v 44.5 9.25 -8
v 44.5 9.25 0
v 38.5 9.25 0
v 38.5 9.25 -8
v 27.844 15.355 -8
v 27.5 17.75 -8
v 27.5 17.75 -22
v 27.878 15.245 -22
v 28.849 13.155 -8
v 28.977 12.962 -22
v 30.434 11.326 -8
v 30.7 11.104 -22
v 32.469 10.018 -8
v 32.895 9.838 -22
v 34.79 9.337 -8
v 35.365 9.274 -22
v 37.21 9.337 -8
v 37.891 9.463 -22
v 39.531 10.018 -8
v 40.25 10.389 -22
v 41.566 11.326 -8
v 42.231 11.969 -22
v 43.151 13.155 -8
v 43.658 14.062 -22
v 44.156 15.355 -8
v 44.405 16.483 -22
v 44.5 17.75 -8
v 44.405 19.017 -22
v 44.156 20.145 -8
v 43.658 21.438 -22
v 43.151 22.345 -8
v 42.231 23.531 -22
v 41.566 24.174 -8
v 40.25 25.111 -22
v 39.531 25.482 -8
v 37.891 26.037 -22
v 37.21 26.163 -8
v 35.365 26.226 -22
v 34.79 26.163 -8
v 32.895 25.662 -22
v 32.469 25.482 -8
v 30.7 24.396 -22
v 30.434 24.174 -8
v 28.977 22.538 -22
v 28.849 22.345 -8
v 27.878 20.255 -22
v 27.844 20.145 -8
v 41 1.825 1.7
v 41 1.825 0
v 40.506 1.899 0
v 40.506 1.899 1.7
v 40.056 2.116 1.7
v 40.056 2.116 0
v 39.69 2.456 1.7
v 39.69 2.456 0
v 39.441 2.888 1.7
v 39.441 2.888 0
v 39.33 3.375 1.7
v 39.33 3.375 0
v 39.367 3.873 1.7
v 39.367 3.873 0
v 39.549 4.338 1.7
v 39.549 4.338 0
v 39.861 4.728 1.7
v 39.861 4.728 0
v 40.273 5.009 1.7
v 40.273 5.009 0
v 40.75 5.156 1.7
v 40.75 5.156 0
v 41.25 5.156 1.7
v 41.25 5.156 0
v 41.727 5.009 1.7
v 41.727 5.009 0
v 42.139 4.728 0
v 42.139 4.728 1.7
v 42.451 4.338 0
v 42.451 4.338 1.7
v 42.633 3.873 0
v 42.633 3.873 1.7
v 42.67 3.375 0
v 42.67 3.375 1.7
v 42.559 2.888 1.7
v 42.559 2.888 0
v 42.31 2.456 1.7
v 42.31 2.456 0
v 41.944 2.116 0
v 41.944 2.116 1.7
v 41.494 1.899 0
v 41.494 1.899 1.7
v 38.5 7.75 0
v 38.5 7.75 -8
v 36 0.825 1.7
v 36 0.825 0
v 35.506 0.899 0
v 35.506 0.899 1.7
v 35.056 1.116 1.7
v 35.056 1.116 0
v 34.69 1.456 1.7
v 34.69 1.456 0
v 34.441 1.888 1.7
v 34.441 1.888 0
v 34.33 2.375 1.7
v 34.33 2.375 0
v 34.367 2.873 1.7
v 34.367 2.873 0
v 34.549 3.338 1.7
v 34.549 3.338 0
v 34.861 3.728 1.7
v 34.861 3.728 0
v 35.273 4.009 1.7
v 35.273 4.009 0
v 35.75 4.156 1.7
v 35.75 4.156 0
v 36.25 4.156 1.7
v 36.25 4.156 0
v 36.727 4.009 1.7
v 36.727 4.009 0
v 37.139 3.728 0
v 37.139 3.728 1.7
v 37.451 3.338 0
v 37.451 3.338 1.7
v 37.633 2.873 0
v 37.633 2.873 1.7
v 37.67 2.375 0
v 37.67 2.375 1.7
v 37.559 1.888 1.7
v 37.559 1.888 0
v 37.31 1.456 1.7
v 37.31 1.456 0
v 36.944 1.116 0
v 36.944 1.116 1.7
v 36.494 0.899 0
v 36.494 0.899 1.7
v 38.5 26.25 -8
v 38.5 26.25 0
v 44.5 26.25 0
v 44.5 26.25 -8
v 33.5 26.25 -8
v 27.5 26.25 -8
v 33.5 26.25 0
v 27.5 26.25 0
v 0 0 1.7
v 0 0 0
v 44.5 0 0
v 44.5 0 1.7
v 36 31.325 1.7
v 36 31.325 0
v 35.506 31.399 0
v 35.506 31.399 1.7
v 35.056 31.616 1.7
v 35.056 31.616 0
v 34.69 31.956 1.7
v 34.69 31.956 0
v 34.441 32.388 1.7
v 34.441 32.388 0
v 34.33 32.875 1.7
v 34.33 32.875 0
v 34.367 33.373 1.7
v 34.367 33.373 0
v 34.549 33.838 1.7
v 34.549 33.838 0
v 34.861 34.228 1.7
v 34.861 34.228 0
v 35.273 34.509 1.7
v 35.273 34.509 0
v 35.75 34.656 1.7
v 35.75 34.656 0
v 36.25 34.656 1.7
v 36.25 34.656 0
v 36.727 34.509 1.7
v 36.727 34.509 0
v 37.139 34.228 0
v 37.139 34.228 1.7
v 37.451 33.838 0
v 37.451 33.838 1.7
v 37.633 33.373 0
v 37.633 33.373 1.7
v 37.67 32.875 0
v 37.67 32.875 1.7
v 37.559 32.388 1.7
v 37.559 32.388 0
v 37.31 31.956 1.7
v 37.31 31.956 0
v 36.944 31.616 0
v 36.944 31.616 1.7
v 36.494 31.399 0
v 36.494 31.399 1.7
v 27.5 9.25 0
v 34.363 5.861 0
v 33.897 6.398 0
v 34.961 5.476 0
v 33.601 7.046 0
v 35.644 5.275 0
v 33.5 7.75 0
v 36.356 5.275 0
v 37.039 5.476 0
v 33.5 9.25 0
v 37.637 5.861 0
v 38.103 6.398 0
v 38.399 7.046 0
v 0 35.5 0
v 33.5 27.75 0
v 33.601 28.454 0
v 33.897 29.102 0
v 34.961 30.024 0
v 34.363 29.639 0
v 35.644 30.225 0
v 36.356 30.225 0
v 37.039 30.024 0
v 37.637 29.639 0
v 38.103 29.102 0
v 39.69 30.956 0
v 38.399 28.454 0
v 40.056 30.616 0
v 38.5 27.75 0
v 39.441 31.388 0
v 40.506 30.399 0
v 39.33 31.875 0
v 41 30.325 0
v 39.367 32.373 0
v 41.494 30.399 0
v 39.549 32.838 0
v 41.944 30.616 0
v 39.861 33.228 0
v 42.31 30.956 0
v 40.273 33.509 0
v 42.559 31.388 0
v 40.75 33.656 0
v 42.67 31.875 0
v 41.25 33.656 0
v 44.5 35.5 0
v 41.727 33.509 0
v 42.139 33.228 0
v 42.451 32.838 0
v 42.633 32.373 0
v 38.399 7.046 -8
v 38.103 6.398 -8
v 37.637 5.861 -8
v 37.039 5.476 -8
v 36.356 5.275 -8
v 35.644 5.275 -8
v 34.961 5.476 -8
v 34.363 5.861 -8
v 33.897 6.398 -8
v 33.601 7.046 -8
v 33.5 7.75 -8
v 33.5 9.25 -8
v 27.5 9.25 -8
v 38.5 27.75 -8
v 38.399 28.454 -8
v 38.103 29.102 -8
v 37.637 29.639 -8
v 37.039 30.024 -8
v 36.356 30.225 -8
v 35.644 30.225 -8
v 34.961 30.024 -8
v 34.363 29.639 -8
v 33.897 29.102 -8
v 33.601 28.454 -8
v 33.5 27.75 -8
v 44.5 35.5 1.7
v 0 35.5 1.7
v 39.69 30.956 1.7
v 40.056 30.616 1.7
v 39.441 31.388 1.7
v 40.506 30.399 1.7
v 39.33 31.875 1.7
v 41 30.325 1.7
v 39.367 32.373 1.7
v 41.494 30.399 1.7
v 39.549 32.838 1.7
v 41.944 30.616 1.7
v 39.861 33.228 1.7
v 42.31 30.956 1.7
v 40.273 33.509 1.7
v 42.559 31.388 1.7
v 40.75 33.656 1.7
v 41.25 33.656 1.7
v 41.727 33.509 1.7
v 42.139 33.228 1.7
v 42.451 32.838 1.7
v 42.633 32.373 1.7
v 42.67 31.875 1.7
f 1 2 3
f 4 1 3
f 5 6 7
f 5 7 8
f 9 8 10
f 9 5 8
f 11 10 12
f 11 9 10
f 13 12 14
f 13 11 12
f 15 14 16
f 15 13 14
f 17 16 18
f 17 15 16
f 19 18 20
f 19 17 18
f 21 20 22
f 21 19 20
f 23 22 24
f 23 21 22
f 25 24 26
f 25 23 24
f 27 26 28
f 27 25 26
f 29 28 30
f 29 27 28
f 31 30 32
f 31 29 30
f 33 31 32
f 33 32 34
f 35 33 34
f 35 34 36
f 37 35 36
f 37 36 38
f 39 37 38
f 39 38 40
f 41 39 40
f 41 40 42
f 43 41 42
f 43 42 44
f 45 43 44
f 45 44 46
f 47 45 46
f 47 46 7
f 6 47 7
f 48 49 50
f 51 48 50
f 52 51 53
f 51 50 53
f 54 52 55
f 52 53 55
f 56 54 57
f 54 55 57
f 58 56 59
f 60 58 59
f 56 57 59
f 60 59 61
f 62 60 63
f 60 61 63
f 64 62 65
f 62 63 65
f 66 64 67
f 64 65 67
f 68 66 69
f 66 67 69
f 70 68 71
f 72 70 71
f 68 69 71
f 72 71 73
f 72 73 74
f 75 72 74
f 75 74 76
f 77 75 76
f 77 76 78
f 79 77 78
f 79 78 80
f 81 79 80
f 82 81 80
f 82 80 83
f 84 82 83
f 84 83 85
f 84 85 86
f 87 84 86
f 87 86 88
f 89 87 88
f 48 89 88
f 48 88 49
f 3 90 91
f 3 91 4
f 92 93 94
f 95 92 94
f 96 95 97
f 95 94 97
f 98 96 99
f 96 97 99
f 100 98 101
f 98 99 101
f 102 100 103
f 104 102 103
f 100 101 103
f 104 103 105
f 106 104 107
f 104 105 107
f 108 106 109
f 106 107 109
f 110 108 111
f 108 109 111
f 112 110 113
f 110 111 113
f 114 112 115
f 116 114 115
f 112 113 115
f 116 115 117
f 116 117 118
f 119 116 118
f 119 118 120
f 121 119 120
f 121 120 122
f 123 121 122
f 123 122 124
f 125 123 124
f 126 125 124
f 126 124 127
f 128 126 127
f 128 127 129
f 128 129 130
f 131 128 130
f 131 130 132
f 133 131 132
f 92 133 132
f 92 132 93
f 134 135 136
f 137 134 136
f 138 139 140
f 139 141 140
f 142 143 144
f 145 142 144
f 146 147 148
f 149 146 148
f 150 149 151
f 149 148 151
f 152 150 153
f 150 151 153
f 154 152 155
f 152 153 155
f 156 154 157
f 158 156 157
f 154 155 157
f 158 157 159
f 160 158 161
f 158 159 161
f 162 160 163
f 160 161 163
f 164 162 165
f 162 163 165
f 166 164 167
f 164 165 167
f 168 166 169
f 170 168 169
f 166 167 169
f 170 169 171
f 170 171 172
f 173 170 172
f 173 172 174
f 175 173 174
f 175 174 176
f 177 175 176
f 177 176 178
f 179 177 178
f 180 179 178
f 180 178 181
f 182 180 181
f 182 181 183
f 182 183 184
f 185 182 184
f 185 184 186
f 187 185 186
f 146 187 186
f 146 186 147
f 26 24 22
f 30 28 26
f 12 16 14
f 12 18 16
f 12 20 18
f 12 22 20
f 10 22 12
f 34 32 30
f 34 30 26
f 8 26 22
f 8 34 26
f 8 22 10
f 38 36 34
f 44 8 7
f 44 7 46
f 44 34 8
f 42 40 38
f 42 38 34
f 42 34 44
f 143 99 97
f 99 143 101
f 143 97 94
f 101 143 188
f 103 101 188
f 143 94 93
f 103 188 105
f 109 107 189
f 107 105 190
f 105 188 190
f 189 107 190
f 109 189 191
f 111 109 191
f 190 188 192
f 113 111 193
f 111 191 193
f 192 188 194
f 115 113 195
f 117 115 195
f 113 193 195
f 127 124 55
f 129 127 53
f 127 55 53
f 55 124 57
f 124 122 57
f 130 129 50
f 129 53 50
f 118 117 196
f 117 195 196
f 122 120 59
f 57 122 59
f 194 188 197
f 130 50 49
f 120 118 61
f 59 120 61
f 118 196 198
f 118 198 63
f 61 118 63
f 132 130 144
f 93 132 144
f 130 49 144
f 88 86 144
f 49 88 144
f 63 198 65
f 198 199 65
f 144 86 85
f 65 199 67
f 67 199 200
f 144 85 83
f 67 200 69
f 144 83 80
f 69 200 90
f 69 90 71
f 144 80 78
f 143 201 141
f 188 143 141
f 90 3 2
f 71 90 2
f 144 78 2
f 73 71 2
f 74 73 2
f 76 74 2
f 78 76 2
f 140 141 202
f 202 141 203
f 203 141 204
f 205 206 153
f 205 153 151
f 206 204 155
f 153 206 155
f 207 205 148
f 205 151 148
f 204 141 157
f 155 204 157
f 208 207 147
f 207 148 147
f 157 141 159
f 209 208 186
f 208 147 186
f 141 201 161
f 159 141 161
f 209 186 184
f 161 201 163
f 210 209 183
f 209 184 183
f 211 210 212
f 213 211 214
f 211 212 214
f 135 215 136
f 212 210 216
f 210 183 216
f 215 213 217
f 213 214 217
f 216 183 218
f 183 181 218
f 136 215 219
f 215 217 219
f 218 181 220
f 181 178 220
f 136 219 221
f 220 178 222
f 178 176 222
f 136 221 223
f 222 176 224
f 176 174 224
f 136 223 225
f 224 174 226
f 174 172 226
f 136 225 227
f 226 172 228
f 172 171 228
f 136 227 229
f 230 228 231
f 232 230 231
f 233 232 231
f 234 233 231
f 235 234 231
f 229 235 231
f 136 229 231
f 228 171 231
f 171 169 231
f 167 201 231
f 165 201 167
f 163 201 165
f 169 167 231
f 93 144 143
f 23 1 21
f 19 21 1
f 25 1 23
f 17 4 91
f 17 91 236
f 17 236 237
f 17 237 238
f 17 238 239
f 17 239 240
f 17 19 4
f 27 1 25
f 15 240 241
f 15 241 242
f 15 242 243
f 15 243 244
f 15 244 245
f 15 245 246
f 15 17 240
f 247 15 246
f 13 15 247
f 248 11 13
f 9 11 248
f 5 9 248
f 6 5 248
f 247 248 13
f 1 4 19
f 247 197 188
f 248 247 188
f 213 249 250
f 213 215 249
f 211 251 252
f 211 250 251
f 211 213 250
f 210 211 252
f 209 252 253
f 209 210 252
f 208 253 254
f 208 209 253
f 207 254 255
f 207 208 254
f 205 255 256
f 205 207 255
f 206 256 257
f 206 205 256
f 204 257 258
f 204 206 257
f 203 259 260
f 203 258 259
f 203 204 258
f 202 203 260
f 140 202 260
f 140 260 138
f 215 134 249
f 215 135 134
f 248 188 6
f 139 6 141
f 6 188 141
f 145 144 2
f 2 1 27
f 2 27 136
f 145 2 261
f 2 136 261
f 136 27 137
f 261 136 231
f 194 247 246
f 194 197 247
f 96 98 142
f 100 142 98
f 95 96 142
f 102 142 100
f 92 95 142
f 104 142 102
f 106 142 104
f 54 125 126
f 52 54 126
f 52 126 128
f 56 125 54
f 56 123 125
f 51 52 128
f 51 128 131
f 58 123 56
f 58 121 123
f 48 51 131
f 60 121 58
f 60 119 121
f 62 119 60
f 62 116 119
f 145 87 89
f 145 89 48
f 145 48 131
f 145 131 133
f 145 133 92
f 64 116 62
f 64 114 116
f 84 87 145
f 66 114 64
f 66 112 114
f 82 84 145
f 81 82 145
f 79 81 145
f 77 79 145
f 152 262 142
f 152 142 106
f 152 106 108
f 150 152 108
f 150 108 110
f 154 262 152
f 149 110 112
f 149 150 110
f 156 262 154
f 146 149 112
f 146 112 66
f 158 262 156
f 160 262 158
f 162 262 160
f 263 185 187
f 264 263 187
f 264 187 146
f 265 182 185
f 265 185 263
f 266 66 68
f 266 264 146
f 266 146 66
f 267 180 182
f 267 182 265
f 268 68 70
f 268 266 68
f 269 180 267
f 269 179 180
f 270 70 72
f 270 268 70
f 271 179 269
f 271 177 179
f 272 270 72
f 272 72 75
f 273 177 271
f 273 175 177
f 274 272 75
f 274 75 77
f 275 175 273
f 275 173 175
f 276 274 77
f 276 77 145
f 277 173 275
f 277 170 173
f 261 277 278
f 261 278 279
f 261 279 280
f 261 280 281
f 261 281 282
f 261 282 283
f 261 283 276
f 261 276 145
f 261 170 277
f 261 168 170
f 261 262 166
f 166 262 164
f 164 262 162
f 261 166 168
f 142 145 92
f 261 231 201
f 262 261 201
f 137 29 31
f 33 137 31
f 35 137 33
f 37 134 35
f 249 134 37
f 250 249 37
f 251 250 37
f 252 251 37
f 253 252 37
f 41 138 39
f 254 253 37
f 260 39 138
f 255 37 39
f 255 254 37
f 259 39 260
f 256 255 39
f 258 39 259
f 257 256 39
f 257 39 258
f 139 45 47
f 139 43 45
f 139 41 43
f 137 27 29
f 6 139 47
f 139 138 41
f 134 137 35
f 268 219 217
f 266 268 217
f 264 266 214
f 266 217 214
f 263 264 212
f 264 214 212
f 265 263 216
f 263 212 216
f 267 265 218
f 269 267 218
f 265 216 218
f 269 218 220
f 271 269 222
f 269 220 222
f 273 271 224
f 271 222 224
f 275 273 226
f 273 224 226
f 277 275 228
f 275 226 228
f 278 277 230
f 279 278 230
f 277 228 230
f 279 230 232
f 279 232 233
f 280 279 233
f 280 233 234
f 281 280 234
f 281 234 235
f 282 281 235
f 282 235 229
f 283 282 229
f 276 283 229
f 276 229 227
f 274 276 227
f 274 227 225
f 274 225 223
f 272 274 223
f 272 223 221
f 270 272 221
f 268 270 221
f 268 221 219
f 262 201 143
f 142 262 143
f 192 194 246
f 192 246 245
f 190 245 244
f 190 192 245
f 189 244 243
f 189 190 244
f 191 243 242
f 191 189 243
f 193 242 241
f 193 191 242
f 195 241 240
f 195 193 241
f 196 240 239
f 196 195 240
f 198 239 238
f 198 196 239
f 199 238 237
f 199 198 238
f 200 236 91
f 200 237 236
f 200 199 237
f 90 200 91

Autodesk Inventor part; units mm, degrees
ref_plane "YZ Plane" through (0, 0, 0) normal (1, 0, 0) x (0, 1, 0)
ref_plane "XZ Plane" through (0, 0, 0) normal (0, 1, 0) x (-1, 0, 0)
ref_plane "XY Plane" through (0, 0, 0) normal (0, 0, 1) x (1, 0, 0)
sketch "Эскиз1" plane through (0, 0, 0) normal (0, 0, 1) x (1, 0, 0)
  line L0 (0, 0) -> (44.5, 0)
  line L1 (44.5, 0) -> (44.5, 35.5)
  line L2 (44.5, 35.5) -> (0, 35.5)
  line L3 (0, 35.5) -> (0, 0)
  dimension "d0" = 44.5
  dimension "d1" = 35.5
extrude "Выдавливание1" add sketch "Эскиз1" along normal blind 1.7
sketch "Эскиз2" plane through (0, 0, 1.7) normal (0, 0, 1) x (1, 0, 0)
  line L0 (0, 0) -> (44.5, 0) projected
  line L1 (44.5, 0) -> (44.5, 3.5)
  line L2 (44.5, 0) -> (44.5, 35.5) projected
  line L3 (44.5, 3.5) -> (41, 3.5)
  line L4 (44.5, 35.5) -> (44.5, 32)
  line L5 (44.5, 32) -> (41, 32)
  line L6 (44.5, 35.5) -> (0, 35.5) projected
  point P0 (36, 33)
  point P1 (36, 2.5)
  point P2 (36, 33)
  dimension "d4" = 3.5
  dimension "d5" = 3.5
  dimension "d6" = 3.5
  dimension "d7" = 3.5
  dimension "d26" = 8.5
  dimension "d27" = 8.5
  dimension "d28" = 2.5
  dimension "d29" = 2.5
hole "Отверстие1" at (41, 32, 1.7) at (41, 3.5, 1.7) at (36, 33, 1.7) at (36, 2.5, 1.7) direction (0, 0, -1) diameter 3.35 depth 15
sketch "Эскиз3" plane through (0, 0, 0) normal (0, 0, -1) x (-1, 0, 0)
  line L0 (-44.5, 0) -> (-44.5, 35.5) projected
  line L1 (-44.5, 0) -> (-44.5, 9.25)
  line L2 (-44.5, 9.25) -> (-27.5, 9.25)
  line L3 (-27.5, 9.25) -> (-27.5, 26.25)
  line L4 (-27.5, 26.25) -> (-44.5, 26.25)
  line L5 (-44.5, 26.25) -> (-44.5, 9.25)
  line L6 (-36, 26.25) -> (-36, 27.75)
  line L7 (-36, 9.25) -> (-36, 7.75)
  circle A0 centre (-36, 7.75) radius 2.5
  circle A1 centre (-36, 27.75) radius 2.5
  line L8 (-38.5, 27.75) -> (-33.5, 27.75)
  line L9 (-33.5, 27.75) -> (-33.5, 26.25)
  line L10 (-33.5, 26.25) -> (-38.5, 26.25)
  line L11 (-38.5, 26.25) -> (-38.5, 27.75)
  line L12 (-33.5, 7.75) -> (-38.5, 7.75)
  line L13 (-38.5, 7.75) -> (-38.5, 9.25)
  line L14 (-38.5, 9.25) -> (-33.5, 9.25)
  line L15 (-33.5, 9.25) -> (-33.5, 7.75)
  point P0 (0, 0)
  dimension "d20" = 5
  dimension "d21" = 5
  dimension "d15" = 9.25
  dimension "d16" = 17
  dimension "d17" = 17
  dimension "d18" = 1.5
  dimension "d19" = 1.5
extrude "Выдавливание2" add sketch "Эскиз3" along normal blind 8
sketch "Эскиз4" plane through (0, 0, -8) normal (0, 0, -1) x (-1, 0, 0)
  line L0 (-44.5, 0) -> (-44.5, 35.5) projected
  line L1 (-44.5, 17.75) -> (-27.5, 17.75)
  line L2 (-27.5, 26.25) -> (-27.5, 9.25) projected
  circle A0 centre (-36, 17.75) radius 8.5
  point P0 (0, 0)
extrude "Выдавливание3" add sketch "Эскиз4" along normal blind 14
equation "\"d4\" = d6"
equation "\"d5\" = d6"
equation "\"d7\" = d6"
properties part number "Техническое зрение OpenMV"
